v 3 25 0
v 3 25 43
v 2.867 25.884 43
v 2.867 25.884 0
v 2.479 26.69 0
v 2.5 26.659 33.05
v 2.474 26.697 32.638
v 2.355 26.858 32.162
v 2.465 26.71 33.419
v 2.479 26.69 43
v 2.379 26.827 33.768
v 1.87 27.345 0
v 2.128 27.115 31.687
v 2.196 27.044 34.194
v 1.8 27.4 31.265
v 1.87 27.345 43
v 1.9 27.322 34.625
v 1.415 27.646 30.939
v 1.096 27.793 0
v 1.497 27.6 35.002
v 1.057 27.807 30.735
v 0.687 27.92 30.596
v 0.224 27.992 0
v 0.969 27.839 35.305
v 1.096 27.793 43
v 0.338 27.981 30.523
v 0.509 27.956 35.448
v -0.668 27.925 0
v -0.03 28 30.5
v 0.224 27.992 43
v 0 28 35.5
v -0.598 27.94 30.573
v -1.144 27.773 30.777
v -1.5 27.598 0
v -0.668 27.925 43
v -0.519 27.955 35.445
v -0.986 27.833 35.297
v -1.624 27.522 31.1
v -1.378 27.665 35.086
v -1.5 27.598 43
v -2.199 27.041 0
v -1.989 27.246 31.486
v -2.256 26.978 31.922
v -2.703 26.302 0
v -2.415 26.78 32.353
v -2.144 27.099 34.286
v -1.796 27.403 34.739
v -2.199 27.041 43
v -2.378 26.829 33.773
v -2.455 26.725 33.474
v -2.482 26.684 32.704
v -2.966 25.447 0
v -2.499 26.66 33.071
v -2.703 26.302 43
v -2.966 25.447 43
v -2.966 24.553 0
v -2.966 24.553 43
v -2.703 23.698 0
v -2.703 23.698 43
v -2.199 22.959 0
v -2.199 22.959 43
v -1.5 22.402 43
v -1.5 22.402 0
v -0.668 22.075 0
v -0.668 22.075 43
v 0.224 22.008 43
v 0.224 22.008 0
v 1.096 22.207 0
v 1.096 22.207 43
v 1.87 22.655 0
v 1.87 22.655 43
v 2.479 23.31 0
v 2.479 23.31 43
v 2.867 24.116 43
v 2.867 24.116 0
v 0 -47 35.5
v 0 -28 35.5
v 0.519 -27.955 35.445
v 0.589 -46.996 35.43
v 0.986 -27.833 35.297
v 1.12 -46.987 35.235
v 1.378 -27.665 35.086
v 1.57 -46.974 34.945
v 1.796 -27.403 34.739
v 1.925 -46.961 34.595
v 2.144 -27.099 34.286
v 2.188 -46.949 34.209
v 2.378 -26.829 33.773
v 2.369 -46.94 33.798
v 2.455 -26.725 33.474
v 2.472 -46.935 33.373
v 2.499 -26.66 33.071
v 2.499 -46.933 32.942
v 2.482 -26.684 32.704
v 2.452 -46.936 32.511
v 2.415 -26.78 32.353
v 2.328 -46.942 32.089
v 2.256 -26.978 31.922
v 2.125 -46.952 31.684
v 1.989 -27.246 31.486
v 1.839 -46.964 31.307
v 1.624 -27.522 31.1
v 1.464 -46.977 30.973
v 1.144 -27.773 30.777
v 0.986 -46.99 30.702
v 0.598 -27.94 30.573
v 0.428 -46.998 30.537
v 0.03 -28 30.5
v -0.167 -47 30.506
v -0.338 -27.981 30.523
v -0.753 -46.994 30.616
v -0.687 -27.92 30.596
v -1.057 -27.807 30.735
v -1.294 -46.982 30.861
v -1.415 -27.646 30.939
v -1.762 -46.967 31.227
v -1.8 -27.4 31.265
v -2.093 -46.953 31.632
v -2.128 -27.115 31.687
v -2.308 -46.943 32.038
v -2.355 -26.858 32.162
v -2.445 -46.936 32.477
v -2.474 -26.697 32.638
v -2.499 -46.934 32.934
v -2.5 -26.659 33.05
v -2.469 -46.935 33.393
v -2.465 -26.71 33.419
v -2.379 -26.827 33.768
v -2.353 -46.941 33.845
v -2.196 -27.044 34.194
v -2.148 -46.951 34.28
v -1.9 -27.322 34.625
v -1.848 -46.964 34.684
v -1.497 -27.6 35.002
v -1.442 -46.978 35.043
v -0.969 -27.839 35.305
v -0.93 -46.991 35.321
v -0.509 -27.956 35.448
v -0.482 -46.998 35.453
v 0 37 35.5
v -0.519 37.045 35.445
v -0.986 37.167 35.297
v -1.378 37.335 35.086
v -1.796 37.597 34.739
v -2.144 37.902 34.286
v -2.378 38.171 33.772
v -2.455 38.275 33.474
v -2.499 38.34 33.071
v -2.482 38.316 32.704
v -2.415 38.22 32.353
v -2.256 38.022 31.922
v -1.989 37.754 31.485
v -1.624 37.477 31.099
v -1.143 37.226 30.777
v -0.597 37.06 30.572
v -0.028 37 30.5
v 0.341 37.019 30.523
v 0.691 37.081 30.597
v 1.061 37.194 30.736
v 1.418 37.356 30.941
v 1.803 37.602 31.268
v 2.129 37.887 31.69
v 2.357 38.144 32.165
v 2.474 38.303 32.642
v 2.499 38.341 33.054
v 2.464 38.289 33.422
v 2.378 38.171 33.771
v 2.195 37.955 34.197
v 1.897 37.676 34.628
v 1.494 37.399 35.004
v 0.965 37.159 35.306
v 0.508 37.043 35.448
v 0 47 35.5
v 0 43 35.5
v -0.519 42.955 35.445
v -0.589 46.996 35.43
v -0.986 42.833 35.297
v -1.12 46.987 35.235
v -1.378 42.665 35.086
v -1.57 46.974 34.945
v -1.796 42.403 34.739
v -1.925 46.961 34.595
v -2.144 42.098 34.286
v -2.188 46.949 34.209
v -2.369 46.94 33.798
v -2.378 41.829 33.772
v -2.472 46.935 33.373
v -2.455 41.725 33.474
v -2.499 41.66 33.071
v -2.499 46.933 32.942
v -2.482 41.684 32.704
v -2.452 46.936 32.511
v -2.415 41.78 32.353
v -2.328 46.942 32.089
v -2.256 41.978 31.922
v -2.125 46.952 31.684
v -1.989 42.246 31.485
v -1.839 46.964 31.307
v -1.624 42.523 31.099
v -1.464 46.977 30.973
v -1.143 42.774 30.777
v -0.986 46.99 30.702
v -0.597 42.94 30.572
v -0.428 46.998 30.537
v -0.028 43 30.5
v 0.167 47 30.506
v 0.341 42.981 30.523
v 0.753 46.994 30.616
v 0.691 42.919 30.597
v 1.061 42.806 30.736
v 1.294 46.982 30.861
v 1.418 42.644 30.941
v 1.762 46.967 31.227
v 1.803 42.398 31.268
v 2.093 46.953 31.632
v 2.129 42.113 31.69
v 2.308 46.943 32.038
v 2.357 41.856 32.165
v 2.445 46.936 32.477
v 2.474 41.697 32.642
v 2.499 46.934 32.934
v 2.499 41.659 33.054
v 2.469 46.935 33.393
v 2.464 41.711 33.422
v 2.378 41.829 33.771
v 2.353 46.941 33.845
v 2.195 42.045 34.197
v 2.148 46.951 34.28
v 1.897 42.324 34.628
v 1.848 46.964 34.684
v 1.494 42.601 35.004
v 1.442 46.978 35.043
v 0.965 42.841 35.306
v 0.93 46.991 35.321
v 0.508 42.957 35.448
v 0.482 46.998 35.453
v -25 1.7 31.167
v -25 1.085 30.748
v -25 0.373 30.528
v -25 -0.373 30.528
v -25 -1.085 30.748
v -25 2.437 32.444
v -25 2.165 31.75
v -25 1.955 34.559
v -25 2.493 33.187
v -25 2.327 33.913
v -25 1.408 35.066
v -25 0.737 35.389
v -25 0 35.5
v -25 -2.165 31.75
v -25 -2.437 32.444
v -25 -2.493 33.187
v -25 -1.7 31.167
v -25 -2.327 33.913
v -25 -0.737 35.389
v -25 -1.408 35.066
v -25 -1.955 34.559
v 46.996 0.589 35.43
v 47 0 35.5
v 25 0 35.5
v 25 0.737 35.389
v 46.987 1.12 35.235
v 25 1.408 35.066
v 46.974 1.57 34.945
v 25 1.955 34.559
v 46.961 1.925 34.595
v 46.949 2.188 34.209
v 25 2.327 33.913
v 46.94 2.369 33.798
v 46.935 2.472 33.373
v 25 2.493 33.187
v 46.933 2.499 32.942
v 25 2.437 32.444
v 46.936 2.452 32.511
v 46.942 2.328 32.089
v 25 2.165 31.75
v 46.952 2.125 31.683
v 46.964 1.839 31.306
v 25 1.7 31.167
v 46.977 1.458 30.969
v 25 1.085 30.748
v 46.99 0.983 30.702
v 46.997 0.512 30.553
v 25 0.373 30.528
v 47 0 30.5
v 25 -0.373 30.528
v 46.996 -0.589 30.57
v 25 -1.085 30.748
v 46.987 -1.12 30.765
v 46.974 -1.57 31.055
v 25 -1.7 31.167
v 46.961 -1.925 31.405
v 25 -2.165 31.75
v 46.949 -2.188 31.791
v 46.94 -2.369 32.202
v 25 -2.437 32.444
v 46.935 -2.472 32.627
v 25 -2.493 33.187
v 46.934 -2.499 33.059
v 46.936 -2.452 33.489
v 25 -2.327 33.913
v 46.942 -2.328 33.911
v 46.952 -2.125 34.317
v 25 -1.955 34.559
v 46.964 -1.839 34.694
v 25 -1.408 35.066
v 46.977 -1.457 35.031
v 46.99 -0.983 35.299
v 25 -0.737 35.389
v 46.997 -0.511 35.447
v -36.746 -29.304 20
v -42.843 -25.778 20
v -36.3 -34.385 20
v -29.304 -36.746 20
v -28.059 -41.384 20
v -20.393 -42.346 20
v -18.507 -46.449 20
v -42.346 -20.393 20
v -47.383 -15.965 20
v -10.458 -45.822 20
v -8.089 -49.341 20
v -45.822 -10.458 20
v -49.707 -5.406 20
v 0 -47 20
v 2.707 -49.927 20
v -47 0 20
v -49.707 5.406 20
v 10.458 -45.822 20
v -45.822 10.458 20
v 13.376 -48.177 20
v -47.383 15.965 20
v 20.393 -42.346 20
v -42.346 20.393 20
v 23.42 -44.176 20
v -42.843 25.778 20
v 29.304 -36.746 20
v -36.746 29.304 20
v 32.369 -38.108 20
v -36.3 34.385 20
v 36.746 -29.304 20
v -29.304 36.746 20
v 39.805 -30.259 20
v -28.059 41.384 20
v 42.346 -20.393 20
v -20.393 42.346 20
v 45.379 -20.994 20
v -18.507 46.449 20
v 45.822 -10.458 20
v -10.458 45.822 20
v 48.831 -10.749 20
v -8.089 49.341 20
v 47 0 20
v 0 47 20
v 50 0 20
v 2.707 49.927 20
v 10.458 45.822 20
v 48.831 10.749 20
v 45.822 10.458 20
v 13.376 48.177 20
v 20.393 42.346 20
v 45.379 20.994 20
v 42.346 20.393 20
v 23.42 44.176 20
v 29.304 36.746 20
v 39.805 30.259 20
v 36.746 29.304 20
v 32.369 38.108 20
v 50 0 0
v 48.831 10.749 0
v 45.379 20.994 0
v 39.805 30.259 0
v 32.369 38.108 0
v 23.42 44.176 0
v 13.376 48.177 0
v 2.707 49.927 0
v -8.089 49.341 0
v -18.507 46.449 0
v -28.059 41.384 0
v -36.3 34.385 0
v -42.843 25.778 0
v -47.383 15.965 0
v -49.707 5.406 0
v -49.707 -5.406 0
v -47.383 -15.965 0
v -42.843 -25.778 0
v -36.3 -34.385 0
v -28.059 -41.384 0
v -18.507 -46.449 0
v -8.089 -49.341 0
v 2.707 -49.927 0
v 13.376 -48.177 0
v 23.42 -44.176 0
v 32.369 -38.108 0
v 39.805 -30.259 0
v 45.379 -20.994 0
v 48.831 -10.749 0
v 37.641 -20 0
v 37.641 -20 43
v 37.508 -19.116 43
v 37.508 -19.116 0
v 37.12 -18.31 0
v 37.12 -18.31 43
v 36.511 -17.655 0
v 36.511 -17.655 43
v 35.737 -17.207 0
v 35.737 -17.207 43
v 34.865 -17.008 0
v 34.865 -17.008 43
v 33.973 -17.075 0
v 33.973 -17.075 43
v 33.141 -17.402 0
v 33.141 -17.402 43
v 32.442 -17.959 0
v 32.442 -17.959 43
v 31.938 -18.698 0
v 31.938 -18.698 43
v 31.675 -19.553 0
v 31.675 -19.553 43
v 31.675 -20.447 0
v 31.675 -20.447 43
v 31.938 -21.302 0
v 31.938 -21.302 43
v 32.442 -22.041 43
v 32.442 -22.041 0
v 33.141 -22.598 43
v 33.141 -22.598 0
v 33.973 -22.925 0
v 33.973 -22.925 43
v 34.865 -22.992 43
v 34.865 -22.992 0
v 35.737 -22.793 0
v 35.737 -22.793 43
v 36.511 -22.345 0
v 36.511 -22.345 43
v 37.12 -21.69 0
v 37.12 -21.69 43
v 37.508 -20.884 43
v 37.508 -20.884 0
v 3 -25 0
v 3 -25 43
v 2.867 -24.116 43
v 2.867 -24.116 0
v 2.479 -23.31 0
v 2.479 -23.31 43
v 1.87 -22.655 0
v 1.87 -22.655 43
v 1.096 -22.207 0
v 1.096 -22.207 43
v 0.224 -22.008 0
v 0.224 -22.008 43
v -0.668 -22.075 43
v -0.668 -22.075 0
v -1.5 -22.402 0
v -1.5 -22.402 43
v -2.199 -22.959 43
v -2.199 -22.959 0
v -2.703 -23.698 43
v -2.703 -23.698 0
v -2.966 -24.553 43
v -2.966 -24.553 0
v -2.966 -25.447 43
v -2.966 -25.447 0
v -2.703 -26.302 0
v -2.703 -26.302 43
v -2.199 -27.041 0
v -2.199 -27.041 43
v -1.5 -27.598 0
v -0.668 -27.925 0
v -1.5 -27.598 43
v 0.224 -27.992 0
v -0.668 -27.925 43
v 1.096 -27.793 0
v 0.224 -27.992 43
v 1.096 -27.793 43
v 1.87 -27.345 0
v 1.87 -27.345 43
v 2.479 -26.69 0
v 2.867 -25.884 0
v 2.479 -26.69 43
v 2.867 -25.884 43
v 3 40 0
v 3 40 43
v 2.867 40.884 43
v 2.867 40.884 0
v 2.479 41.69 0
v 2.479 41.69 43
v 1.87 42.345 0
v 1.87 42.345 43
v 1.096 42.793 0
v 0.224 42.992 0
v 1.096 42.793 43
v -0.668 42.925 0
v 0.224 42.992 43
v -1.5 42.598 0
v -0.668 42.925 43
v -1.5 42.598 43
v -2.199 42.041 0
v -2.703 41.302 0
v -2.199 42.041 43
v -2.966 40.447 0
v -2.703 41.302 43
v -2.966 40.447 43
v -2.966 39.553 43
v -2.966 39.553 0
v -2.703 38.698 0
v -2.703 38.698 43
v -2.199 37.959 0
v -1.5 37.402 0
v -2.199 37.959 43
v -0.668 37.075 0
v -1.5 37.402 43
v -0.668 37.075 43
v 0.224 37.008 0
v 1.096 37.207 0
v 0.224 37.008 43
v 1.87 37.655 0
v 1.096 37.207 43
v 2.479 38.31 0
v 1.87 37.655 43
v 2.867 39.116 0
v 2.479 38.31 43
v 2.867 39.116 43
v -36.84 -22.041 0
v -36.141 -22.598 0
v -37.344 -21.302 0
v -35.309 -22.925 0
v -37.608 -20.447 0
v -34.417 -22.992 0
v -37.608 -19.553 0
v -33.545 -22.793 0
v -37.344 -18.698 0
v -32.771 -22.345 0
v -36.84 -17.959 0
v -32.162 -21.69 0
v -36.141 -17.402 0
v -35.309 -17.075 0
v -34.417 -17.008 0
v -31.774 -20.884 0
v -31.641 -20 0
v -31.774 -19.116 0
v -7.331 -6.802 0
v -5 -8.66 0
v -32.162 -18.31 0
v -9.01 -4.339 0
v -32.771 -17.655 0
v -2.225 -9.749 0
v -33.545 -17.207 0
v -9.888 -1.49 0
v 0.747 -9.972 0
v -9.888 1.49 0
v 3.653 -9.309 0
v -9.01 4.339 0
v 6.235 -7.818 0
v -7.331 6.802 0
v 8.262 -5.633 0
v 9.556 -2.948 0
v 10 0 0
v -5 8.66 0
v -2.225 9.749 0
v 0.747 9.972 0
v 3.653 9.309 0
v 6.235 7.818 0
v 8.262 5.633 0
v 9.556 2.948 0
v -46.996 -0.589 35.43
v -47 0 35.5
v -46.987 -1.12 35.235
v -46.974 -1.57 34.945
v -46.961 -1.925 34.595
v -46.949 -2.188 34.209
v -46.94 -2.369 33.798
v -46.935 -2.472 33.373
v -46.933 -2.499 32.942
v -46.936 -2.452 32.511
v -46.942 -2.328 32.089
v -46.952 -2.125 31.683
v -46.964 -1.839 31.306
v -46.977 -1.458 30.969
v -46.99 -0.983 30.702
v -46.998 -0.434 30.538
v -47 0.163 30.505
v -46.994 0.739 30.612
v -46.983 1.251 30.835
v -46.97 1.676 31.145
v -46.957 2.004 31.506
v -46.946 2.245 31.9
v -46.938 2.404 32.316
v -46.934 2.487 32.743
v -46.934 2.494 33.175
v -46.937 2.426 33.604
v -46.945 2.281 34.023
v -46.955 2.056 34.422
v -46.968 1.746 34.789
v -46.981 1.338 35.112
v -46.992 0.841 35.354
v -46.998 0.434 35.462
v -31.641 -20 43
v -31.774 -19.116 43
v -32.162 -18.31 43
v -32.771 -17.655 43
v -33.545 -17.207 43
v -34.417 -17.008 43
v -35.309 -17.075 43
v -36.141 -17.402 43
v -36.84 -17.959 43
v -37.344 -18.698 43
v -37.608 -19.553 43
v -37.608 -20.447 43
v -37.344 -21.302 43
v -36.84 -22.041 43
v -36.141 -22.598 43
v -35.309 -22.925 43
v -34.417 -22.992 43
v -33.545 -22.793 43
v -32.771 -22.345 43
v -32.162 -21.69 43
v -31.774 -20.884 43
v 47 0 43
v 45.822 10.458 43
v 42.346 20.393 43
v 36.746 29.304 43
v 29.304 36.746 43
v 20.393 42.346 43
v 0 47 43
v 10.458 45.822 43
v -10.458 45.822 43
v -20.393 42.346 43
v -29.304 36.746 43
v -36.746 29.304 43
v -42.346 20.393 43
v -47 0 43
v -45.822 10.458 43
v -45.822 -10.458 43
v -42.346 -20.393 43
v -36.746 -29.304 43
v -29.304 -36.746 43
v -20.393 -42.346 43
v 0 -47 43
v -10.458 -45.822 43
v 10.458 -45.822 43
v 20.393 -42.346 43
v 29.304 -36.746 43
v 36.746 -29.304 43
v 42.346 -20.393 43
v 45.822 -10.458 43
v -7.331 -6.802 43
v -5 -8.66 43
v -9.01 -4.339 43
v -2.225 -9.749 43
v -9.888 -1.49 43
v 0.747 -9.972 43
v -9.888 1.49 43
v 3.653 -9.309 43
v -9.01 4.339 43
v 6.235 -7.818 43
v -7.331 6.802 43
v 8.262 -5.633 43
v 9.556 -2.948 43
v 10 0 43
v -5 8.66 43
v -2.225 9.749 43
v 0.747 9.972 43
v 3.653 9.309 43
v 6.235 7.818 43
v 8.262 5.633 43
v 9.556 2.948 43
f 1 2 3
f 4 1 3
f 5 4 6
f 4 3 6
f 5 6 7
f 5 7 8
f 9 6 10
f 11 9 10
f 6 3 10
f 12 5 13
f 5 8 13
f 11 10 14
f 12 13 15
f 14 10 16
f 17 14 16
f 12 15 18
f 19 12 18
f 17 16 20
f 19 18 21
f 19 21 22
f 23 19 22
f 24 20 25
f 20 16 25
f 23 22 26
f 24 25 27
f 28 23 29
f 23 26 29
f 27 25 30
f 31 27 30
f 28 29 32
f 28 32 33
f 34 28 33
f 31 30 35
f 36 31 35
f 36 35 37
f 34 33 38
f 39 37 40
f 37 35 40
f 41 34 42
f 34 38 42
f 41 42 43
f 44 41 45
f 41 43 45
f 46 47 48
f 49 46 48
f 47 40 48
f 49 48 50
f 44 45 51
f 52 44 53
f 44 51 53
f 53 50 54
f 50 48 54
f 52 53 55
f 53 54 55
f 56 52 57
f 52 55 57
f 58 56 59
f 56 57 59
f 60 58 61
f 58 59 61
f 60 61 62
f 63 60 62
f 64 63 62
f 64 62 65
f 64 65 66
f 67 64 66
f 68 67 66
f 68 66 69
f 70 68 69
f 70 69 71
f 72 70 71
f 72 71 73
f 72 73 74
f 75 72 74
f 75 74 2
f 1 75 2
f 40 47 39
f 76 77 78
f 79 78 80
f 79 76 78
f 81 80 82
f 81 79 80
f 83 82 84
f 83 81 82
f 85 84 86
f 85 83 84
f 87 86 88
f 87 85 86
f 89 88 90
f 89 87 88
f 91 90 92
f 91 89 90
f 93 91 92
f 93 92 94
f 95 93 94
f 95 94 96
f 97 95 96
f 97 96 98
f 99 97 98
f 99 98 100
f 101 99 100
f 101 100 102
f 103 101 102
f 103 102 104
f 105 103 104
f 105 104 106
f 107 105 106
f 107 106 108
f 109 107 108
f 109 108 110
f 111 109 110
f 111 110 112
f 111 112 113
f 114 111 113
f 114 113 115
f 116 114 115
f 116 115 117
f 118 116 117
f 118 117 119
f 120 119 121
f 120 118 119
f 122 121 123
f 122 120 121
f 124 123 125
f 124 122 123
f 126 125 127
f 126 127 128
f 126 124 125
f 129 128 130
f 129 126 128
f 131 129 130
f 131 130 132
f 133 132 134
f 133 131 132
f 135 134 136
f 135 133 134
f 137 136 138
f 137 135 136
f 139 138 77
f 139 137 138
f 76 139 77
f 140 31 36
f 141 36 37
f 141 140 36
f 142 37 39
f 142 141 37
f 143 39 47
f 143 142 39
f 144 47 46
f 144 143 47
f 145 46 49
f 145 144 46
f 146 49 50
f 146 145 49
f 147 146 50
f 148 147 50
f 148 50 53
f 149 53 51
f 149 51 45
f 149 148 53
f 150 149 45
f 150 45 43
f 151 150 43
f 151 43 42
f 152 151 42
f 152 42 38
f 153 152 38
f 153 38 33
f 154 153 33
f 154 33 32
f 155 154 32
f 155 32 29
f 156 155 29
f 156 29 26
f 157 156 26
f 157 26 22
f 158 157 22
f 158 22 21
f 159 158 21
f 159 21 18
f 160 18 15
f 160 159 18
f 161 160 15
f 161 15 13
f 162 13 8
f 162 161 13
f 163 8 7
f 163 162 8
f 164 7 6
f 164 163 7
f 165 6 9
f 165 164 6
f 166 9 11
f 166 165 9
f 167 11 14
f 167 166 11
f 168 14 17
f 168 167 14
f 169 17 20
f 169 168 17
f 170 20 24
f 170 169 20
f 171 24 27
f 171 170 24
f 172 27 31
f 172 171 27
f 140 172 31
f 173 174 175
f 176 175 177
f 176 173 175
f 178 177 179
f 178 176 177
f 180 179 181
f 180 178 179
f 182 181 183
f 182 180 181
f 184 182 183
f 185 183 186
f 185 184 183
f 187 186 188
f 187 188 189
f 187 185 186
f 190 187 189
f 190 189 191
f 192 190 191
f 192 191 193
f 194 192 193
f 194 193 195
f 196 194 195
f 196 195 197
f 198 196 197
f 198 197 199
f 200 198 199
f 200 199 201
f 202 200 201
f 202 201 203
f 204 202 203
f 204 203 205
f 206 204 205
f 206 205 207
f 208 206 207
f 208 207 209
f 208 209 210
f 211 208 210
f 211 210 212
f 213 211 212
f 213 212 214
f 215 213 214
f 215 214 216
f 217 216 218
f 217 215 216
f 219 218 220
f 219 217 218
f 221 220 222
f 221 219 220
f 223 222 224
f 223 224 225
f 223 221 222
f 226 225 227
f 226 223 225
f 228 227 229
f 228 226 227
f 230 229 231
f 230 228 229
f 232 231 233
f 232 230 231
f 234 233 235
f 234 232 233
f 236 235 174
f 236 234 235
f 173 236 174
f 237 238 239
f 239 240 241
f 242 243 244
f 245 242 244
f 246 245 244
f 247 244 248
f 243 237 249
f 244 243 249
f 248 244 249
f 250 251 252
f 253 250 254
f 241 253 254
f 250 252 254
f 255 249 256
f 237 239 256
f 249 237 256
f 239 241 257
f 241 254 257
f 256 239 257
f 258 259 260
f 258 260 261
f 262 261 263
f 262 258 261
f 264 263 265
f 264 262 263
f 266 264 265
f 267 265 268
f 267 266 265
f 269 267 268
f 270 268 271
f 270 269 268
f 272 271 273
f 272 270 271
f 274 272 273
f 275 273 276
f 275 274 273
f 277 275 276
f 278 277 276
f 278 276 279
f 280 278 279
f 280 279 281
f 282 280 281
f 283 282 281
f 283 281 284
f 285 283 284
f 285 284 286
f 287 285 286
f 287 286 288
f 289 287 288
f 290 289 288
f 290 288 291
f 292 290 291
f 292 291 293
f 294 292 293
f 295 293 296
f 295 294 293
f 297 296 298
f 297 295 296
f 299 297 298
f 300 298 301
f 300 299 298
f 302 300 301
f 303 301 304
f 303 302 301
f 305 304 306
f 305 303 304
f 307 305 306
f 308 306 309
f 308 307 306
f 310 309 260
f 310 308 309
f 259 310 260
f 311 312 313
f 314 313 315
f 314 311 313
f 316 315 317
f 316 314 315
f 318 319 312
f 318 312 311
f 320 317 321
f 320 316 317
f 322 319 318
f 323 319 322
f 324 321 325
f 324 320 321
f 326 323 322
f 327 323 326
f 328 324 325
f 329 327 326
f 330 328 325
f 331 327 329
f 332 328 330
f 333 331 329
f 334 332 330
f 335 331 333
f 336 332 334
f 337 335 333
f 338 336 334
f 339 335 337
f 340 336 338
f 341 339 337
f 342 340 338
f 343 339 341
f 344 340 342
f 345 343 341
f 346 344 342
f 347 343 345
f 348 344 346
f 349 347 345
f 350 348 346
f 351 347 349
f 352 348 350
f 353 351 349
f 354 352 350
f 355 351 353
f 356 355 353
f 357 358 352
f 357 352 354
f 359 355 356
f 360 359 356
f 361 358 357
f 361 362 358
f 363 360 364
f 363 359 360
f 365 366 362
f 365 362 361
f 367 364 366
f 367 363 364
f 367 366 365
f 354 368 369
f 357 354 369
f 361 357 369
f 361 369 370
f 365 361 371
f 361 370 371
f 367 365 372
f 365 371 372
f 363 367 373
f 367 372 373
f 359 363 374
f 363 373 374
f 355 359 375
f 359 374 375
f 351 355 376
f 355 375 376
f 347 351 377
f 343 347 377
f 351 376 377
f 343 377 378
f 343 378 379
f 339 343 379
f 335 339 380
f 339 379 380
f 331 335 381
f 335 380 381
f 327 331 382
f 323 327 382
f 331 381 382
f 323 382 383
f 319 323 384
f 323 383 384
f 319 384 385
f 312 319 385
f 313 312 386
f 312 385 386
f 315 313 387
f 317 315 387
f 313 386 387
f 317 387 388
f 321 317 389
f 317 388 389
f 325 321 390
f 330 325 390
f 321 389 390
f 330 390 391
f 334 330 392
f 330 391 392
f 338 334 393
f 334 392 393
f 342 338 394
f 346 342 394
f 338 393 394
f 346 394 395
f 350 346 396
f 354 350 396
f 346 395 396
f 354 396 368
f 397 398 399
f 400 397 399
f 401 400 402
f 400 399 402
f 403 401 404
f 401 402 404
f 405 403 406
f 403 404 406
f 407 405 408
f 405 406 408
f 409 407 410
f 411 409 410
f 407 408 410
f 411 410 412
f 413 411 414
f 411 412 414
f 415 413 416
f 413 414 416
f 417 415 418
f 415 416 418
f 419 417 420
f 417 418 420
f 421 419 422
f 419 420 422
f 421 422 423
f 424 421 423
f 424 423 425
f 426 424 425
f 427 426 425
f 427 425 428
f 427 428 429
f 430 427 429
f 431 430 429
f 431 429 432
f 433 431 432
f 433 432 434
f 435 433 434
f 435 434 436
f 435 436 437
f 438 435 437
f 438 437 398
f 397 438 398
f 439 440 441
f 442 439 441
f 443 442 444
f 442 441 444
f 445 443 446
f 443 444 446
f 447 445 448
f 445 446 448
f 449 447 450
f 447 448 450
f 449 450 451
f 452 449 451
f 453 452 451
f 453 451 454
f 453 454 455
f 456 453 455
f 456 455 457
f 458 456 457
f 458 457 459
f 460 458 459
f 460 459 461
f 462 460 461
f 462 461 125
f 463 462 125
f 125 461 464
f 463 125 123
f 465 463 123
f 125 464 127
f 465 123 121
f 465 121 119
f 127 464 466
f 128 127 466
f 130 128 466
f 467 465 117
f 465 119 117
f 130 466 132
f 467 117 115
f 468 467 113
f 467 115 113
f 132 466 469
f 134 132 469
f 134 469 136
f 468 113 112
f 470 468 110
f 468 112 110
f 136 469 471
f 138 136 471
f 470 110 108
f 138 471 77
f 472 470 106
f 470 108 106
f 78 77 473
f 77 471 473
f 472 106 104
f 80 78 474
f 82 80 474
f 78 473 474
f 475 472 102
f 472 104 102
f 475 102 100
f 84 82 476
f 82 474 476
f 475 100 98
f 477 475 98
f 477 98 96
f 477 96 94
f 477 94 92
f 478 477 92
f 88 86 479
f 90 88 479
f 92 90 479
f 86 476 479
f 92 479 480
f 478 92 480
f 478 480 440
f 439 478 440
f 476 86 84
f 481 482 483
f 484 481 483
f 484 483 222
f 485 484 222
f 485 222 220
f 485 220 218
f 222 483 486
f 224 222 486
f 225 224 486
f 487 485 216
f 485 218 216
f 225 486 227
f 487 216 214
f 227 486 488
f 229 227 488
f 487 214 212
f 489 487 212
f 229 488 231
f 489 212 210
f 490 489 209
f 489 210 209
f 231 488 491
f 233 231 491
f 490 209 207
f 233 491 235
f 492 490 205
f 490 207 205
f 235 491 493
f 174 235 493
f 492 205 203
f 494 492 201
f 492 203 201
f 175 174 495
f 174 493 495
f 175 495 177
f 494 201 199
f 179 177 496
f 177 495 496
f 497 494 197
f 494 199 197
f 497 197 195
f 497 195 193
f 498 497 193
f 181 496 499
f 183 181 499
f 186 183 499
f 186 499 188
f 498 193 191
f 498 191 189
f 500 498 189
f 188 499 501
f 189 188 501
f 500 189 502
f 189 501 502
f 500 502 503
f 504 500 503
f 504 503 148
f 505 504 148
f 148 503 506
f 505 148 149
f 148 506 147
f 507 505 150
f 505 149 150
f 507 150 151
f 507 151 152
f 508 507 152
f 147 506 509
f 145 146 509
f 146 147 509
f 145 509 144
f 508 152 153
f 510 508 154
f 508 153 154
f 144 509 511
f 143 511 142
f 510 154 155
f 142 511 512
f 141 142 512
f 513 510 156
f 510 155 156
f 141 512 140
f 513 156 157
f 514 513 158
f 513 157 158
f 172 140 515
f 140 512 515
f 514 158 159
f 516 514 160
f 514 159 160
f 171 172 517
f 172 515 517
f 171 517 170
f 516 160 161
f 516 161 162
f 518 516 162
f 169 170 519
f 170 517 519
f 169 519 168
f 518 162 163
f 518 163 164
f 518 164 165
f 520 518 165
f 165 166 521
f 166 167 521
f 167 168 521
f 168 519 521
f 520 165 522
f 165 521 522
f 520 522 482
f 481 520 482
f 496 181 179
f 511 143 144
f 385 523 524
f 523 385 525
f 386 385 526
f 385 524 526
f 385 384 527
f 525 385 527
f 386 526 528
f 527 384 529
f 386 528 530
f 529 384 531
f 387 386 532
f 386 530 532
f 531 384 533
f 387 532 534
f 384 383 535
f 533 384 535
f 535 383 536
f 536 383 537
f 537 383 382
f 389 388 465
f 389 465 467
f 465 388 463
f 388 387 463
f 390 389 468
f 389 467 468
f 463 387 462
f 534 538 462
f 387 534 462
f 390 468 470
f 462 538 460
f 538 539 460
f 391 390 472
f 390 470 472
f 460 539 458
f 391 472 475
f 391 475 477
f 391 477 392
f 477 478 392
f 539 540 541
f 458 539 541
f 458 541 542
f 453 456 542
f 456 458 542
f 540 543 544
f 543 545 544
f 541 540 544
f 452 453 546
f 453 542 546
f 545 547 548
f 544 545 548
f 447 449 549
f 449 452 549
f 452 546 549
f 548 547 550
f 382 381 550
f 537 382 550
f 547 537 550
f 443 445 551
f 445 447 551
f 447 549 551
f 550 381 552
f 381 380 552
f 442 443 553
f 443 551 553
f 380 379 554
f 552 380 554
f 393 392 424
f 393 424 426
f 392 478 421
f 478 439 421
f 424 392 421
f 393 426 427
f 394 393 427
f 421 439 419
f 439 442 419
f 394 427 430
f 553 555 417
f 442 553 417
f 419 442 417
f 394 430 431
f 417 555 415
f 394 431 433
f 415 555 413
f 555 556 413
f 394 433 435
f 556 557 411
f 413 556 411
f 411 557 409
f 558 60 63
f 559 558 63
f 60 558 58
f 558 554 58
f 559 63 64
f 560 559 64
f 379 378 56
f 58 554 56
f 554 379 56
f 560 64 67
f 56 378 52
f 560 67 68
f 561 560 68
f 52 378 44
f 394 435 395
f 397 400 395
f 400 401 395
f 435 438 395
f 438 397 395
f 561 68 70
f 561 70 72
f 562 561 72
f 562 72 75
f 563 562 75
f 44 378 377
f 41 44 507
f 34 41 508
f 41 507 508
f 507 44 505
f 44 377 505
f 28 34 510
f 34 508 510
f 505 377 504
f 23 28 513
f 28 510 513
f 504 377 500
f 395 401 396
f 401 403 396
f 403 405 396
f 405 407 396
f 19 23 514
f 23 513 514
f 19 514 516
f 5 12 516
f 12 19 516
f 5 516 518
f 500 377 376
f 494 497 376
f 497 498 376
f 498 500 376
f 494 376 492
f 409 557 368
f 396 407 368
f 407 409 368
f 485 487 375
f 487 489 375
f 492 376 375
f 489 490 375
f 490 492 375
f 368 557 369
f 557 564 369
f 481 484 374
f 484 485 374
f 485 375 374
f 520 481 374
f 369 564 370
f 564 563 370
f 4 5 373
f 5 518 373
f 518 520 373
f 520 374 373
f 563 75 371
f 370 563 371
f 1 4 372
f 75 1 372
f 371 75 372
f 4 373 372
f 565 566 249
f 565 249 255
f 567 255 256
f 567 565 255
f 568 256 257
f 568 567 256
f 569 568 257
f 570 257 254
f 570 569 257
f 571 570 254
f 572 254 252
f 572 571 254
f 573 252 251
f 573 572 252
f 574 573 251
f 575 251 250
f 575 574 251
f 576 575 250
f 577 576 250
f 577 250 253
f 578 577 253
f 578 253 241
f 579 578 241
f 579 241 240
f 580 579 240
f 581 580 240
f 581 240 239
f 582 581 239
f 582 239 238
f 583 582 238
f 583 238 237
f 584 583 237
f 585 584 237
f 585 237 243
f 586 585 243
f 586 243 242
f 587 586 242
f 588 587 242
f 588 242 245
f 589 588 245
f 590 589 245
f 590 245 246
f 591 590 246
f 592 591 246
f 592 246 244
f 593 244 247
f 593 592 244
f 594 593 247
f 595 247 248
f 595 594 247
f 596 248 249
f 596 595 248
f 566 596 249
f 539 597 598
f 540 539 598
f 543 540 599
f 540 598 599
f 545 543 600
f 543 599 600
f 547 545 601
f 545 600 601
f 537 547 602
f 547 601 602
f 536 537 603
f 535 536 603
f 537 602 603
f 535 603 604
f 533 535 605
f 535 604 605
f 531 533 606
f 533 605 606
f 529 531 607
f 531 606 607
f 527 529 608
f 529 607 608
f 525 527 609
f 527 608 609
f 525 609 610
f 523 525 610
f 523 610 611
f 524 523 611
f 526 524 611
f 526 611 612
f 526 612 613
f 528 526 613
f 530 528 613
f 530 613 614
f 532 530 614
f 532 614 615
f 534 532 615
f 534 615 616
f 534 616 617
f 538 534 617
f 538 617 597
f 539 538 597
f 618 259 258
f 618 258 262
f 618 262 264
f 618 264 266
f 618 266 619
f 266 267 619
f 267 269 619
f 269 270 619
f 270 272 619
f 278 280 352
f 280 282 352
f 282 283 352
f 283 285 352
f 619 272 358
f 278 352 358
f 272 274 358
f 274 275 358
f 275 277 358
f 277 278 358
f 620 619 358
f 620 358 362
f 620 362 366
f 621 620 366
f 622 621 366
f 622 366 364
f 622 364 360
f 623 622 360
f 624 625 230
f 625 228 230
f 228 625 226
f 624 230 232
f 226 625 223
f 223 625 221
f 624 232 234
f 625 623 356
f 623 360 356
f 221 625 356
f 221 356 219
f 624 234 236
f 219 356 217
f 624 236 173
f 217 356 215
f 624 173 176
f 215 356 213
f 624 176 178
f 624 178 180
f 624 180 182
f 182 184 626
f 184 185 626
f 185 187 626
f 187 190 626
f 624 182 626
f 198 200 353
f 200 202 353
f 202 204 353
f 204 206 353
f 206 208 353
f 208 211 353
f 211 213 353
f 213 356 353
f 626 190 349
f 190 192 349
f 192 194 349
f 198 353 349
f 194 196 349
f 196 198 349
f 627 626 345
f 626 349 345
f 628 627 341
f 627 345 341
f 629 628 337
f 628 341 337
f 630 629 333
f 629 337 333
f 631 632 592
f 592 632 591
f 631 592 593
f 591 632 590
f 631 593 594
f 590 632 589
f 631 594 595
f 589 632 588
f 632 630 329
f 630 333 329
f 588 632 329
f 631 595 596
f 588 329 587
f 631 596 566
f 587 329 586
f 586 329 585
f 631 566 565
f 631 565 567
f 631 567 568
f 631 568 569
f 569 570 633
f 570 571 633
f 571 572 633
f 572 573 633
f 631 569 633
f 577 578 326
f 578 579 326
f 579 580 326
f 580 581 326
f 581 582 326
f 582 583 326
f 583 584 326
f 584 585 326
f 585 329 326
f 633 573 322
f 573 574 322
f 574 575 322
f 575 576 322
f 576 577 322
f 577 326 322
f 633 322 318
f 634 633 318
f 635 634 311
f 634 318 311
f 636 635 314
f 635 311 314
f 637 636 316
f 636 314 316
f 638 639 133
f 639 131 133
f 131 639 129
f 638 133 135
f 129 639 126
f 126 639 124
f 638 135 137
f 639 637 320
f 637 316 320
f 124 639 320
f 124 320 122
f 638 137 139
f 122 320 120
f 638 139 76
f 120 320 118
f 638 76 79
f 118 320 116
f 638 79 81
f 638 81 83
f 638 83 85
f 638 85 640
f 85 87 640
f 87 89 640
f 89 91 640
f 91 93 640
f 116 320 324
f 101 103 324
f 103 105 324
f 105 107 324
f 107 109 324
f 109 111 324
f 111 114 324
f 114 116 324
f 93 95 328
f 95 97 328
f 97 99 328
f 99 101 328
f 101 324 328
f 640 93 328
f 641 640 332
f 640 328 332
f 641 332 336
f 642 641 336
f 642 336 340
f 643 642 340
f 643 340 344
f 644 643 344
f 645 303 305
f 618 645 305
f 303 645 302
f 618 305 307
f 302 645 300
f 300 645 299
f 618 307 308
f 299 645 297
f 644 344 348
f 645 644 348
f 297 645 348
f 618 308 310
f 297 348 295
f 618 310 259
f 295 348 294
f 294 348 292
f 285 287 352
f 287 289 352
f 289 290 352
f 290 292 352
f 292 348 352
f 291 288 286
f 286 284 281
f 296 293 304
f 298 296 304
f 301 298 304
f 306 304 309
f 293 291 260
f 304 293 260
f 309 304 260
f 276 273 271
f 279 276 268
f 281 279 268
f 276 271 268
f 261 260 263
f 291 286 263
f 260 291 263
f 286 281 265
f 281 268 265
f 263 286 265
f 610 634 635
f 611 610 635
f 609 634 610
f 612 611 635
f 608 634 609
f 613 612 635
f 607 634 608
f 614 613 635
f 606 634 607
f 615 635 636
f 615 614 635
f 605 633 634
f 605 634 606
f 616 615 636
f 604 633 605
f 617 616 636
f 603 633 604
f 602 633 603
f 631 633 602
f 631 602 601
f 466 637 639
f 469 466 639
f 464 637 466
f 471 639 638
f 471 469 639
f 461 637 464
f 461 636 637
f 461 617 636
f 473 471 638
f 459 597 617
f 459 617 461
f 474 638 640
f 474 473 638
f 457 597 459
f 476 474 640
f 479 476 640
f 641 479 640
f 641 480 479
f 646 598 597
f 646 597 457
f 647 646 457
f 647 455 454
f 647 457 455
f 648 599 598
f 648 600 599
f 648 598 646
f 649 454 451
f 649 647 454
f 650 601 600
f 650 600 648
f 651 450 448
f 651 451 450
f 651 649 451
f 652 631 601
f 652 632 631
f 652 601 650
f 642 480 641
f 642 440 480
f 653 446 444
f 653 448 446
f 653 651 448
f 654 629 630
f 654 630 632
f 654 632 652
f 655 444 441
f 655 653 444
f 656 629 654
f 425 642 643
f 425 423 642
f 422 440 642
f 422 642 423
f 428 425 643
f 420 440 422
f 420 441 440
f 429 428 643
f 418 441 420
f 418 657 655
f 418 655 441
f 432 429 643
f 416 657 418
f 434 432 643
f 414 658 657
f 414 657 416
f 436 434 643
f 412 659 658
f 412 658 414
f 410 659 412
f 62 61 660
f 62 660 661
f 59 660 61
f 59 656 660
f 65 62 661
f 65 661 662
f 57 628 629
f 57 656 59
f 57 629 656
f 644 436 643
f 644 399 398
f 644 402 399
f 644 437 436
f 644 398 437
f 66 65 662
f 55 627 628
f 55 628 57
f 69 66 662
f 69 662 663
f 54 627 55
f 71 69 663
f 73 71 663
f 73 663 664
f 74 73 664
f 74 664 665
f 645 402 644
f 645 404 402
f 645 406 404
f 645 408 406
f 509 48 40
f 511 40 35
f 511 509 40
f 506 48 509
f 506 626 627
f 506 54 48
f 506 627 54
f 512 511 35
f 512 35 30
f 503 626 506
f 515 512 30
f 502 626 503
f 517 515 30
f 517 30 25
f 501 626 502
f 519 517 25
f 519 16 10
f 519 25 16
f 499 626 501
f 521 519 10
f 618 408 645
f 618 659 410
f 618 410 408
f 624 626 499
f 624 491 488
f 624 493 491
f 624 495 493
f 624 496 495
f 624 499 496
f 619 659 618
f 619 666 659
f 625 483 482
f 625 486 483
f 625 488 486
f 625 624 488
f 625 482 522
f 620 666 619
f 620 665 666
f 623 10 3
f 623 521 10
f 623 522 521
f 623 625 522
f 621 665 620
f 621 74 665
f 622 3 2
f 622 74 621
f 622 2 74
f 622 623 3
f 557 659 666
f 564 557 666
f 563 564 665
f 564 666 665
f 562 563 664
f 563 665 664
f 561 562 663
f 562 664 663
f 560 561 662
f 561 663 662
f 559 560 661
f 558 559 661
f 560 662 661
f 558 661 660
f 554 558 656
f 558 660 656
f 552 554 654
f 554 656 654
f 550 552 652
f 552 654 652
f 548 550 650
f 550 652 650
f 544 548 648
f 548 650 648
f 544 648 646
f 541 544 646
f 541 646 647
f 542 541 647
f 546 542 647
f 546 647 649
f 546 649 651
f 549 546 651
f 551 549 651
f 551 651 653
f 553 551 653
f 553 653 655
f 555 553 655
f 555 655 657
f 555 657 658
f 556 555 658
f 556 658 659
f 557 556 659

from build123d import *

# Parameters (mm, degrees)
SKETCH1_R           = 50
BOSS_EXTRUDE1_DEPTH = 20
SKETCH2_R           = 47
BOSS_EXTRUDE2_DEPTH = 23
SKETCH3_R           = 3
SKETCH3_R_2         = 10
CUT_EXTRUDE1_DEPTH  = 83.758685345
SKETCH5_R           = 2.5
CUT_EXTRUDE3_DEPTH  = 25
CIRPATTERN1_COUNT   = 4


with BuildPart() as part:
    # Sketch1 → Boss-Extrude1 (new body)
    with BuildSketch(Plane.XY):
        Circle(SKETCH1_R)
    extrude(amount=BOSS_EXTRUDE1_DEPTH)

    # Sketch2 → Boss-Extrude2 (add)
    with BuildSketch(Plane.XY.offset(20)):
        Circle(SKETCH2_R)
    extrude(amount=BOSS_EXTRUDE2_DEPTH)

    # Sketch3 → Cut-Extrude1 (cut, through all)
    with BuildSketch(Plane.XY.offset(43)):
        with Locations((0, 40)):
            Circle(SKETCH3_R)
        with Locations((34.641016151, -20)):
            Circle(SKETCH3_R)
        with Locations((-34.641016151, -20)):
            Circle(SKETCH3_R)
        with Locations((0, -25)):
            Circle(SKETCH3_R)
        with Locations((0, 25)):
            Circle(SKETCH3_R)
        Circle(SKETCH3_R_2)
    extrude(amount=-CUT_EXTRUDE1_DEPTH, mode=Mode.SUBTRACT)

    # Sketch5 → Cut-Extrude3 (cut)
    with BuildSketch(Plane.ZY.offset(-50)):
        with Locations((33, 0)):
            Circle(SKETCH5_R)
    cut_extrude3 = extrude(amount=CUT_EXTRUDE3_DEPTH, mode=Mode.SUBTRACT)

    # CirPattern1: Cut-Extrude3 ×4 about axis
    cirpattern1_axis = Axis((0, 0, 43), (0, 0, -1))
    for i in range(1, CIRPATTERN1_COUNT):
        add(cut_extrude3.rotate(cirpattern1_axis, i * 360 / CIRPATTERN1_COUNT), mode=Mode.SUBTRACT)


solid = part.part
